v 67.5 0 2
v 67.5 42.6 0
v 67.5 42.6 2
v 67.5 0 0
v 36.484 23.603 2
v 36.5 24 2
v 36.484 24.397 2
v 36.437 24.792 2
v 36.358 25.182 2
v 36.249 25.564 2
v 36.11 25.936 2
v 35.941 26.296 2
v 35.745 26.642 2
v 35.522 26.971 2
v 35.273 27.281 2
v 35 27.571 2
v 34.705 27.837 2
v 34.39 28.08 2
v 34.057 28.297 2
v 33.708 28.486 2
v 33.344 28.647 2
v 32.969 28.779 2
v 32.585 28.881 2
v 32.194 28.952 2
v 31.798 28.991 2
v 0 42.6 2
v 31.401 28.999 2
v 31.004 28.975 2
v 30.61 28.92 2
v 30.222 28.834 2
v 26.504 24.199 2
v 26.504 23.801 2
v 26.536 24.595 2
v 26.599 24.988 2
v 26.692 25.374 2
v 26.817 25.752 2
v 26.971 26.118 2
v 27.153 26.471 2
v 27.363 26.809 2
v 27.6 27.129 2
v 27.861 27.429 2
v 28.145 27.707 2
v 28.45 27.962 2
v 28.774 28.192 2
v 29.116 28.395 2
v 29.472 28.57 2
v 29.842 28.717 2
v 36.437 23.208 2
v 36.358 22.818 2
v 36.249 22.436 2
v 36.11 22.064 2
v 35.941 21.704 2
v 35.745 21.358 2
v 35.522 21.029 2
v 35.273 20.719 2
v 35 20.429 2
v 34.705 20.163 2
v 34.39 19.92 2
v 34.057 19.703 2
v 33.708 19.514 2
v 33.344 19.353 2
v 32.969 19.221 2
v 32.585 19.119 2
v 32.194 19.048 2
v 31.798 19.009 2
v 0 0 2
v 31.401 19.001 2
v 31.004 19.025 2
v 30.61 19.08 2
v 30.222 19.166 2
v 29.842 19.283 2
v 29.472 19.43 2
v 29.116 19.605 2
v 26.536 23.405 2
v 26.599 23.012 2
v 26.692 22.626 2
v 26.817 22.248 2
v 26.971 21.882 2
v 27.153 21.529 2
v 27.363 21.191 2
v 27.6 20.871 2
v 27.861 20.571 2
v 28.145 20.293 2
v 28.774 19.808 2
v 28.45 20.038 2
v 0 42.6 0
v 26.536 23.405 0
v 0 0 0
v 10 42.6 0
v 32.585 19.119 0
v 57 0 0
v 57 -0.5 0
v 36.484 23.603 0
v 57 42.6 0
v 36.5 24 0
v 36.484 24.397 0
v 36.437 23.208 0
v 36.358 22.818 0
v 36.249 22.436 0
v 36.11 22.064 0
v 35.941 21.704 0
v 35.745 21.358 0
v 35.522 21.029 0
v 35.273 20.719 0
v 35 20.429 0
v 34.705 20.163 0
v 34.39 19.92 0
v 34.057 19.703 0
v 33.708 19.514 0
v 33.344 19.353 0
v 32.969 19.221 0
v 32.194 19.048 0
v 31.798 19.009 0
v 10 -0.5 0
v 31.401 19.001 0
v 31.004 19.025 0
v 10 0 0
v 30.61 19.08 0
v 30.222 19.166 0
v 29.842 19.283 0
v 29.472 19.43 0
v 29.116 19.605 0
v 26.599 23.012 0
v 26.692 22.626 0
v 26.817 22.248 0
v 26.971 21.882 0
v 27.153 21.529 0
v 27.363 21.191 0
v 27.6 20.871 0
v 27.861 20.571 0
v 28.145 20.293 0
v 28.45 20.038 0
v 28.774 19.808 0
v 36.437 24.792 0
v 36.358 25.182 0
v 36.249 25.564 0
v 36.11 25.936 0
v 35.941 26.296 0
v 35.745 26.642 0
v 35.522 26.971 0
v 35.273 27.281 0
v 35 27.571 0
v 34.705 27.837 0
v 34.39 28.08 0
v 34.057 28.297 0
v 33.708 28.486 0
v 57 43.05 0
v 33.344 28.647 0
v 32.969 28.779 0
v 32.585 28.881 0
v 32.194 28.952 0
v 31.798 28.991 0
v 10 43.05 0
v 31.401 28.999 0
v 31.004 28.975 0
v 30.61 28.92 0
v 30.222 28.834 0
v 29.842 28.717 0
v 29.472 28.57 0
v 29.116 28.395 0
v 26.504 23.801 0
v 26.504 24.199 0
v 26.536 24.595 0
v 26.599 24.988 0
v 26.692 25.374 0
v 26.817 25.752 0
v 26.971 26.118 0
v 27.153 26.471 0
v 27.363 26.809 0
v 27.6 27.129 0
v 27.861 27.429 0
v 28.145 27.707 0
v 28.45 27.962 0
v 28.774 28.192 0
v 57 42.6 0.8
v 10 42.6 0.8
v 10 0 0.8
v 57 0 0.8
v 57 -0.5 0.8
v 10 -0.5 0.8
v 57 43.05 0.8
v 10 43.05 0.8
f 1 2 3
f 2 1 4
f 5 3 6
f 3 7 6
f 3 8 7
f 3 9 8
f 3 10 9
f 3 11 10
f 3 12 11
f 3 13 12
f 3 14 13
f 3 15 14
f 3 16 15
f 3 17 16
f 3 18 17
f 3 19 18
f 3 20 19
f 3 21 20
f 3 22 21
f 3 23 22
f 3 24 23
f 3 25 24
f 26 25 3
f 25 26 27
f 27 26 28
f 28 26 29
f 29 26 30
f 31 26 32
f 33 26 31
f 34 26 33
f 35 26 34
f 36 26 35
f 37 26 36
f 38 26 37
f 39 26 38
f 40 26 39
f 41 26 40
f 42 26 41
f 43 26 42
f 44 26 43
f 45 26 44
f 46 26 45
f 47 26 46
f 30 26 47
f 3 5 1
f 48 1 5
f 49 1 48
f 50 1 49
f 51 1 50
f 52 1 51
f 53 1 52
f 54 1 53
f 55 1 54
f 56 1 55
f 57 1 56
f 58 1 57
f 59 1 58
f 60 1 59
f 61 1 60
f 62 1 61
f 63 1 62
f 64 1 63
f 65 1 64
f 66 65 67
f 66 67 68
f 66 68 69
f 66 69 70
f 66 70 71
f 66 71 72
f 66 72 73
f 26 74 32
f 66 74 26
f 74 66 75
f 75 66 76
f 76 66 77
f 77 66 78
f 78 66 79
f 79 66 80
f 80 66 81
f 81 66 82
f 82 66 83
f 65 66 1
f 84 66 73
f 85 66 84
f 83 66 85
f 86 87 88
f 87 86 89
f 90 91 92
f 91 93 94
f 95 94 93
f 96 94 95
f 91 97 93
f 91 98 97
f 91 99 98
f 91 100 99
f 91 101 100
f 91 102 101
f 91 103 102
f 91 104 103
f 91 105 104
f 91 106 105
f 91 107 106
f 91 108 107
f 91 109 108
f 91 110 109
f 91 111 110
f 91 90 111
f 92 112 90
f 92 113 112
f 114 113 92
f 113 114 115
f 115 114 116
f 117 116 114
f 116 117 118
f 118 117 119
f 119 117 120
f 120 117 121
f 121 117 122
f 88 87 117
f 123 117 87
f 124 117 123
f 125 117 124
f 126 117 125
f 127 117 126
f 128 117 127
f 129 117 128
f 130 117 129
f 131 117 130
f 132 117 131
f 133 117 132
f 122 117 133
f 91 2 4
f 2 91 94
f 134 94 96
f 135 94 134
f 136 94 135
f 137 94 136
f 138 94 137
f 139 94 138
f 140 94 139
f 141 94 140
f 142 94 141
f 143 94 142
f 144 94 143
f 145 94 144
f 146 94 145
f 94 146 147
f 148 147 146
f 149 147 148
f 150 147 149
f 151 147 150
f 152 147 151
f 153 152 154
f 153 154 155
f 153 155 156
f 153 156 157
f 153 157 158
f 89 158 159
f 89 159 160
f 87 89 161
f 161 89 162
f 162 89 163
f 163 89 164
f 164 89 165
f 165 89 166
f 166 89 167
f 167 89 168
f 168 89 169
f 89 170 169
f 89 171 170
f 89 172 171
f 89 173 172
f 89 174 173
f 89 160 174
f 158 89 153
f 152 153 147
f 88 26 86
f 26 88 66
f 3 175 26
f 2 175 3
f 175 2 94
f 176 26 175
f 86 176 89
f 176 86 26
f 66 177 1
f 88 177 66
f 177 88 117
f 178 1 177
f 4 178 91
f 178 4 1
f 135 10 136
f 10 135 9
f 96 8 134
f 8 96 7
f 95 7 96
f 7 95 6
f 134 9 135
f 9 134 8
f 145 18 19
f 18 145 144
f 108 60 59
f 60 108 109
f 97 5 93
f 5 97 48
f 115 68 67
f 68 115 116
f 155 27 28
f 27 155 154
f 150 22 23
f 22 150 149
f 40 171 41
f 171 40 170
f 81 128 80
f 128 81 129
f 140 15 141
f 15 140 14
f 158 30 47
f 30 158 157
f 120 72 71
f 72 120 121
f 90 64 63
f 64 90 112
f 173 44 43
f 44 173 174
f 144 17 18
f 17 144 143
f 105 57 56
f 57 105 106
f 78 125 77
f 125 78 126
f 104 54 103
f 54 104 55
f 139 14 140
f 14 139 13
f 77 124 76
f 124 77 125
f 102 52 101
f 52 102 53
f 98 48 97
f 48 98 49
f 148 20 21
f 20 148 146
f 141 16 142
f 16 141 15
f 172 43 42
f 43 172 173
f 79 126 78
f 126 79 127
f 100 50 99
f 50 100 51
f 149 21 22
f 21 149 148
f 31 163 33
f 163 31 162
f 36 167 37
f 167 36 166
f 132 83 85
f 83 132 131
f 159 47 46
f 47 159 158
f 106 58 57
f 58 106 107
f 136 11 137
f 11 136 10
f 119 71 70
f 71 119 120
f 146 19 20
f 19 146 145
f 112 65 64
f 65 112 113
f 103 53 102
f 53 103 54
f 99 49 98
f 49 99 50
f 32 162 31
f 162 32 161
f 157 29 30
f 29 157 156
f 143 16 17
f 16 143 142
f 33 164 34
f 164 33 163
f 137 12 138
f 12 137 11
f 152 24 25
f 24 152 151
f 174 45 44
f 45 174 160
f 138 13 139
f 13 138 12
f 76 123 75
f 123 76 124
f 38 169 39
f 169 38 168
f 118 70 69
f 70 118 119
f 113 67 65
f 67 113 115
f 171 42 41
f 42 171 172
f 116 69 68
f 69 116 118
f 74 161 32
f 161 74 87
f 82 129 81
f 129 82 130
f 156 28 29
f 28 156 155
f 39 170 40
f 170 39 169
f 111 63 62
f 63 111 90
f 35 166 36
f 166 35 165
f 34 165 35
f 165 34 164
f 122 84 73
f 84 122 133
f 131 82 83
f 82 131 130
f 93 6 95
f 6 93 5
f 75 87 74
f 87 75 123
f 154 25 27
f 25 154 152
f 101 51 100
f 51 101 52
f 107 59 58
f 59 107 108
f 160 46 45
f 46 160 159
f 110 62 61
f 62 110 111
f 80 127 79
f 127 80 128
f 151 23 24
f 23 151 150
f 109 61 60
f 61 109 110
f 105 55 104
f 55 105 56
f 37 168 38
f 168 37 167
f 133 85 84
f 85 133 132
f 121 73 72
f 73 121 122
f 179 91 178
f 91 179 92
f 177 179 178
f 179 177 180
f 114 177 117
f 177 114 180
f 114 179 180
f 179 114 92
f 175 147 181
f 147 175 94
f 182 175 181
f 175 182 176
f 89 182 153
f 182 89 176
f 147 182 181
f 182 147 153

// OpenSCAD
$fa = 1;  
$fs = 0.4;  

difference() {
    cube([67.5, 42.6, 2]);
    
    translate([31.5, 24, -1])
        cylinder(h=4, r=5);

}

    // Indents on top inner long wall
    translate([10, -0.5, 0])
        cube([47, 0.7, 0.8]);

    translate([10, 42.35, 0])
        cube([47, 0.7, 0.8]);
